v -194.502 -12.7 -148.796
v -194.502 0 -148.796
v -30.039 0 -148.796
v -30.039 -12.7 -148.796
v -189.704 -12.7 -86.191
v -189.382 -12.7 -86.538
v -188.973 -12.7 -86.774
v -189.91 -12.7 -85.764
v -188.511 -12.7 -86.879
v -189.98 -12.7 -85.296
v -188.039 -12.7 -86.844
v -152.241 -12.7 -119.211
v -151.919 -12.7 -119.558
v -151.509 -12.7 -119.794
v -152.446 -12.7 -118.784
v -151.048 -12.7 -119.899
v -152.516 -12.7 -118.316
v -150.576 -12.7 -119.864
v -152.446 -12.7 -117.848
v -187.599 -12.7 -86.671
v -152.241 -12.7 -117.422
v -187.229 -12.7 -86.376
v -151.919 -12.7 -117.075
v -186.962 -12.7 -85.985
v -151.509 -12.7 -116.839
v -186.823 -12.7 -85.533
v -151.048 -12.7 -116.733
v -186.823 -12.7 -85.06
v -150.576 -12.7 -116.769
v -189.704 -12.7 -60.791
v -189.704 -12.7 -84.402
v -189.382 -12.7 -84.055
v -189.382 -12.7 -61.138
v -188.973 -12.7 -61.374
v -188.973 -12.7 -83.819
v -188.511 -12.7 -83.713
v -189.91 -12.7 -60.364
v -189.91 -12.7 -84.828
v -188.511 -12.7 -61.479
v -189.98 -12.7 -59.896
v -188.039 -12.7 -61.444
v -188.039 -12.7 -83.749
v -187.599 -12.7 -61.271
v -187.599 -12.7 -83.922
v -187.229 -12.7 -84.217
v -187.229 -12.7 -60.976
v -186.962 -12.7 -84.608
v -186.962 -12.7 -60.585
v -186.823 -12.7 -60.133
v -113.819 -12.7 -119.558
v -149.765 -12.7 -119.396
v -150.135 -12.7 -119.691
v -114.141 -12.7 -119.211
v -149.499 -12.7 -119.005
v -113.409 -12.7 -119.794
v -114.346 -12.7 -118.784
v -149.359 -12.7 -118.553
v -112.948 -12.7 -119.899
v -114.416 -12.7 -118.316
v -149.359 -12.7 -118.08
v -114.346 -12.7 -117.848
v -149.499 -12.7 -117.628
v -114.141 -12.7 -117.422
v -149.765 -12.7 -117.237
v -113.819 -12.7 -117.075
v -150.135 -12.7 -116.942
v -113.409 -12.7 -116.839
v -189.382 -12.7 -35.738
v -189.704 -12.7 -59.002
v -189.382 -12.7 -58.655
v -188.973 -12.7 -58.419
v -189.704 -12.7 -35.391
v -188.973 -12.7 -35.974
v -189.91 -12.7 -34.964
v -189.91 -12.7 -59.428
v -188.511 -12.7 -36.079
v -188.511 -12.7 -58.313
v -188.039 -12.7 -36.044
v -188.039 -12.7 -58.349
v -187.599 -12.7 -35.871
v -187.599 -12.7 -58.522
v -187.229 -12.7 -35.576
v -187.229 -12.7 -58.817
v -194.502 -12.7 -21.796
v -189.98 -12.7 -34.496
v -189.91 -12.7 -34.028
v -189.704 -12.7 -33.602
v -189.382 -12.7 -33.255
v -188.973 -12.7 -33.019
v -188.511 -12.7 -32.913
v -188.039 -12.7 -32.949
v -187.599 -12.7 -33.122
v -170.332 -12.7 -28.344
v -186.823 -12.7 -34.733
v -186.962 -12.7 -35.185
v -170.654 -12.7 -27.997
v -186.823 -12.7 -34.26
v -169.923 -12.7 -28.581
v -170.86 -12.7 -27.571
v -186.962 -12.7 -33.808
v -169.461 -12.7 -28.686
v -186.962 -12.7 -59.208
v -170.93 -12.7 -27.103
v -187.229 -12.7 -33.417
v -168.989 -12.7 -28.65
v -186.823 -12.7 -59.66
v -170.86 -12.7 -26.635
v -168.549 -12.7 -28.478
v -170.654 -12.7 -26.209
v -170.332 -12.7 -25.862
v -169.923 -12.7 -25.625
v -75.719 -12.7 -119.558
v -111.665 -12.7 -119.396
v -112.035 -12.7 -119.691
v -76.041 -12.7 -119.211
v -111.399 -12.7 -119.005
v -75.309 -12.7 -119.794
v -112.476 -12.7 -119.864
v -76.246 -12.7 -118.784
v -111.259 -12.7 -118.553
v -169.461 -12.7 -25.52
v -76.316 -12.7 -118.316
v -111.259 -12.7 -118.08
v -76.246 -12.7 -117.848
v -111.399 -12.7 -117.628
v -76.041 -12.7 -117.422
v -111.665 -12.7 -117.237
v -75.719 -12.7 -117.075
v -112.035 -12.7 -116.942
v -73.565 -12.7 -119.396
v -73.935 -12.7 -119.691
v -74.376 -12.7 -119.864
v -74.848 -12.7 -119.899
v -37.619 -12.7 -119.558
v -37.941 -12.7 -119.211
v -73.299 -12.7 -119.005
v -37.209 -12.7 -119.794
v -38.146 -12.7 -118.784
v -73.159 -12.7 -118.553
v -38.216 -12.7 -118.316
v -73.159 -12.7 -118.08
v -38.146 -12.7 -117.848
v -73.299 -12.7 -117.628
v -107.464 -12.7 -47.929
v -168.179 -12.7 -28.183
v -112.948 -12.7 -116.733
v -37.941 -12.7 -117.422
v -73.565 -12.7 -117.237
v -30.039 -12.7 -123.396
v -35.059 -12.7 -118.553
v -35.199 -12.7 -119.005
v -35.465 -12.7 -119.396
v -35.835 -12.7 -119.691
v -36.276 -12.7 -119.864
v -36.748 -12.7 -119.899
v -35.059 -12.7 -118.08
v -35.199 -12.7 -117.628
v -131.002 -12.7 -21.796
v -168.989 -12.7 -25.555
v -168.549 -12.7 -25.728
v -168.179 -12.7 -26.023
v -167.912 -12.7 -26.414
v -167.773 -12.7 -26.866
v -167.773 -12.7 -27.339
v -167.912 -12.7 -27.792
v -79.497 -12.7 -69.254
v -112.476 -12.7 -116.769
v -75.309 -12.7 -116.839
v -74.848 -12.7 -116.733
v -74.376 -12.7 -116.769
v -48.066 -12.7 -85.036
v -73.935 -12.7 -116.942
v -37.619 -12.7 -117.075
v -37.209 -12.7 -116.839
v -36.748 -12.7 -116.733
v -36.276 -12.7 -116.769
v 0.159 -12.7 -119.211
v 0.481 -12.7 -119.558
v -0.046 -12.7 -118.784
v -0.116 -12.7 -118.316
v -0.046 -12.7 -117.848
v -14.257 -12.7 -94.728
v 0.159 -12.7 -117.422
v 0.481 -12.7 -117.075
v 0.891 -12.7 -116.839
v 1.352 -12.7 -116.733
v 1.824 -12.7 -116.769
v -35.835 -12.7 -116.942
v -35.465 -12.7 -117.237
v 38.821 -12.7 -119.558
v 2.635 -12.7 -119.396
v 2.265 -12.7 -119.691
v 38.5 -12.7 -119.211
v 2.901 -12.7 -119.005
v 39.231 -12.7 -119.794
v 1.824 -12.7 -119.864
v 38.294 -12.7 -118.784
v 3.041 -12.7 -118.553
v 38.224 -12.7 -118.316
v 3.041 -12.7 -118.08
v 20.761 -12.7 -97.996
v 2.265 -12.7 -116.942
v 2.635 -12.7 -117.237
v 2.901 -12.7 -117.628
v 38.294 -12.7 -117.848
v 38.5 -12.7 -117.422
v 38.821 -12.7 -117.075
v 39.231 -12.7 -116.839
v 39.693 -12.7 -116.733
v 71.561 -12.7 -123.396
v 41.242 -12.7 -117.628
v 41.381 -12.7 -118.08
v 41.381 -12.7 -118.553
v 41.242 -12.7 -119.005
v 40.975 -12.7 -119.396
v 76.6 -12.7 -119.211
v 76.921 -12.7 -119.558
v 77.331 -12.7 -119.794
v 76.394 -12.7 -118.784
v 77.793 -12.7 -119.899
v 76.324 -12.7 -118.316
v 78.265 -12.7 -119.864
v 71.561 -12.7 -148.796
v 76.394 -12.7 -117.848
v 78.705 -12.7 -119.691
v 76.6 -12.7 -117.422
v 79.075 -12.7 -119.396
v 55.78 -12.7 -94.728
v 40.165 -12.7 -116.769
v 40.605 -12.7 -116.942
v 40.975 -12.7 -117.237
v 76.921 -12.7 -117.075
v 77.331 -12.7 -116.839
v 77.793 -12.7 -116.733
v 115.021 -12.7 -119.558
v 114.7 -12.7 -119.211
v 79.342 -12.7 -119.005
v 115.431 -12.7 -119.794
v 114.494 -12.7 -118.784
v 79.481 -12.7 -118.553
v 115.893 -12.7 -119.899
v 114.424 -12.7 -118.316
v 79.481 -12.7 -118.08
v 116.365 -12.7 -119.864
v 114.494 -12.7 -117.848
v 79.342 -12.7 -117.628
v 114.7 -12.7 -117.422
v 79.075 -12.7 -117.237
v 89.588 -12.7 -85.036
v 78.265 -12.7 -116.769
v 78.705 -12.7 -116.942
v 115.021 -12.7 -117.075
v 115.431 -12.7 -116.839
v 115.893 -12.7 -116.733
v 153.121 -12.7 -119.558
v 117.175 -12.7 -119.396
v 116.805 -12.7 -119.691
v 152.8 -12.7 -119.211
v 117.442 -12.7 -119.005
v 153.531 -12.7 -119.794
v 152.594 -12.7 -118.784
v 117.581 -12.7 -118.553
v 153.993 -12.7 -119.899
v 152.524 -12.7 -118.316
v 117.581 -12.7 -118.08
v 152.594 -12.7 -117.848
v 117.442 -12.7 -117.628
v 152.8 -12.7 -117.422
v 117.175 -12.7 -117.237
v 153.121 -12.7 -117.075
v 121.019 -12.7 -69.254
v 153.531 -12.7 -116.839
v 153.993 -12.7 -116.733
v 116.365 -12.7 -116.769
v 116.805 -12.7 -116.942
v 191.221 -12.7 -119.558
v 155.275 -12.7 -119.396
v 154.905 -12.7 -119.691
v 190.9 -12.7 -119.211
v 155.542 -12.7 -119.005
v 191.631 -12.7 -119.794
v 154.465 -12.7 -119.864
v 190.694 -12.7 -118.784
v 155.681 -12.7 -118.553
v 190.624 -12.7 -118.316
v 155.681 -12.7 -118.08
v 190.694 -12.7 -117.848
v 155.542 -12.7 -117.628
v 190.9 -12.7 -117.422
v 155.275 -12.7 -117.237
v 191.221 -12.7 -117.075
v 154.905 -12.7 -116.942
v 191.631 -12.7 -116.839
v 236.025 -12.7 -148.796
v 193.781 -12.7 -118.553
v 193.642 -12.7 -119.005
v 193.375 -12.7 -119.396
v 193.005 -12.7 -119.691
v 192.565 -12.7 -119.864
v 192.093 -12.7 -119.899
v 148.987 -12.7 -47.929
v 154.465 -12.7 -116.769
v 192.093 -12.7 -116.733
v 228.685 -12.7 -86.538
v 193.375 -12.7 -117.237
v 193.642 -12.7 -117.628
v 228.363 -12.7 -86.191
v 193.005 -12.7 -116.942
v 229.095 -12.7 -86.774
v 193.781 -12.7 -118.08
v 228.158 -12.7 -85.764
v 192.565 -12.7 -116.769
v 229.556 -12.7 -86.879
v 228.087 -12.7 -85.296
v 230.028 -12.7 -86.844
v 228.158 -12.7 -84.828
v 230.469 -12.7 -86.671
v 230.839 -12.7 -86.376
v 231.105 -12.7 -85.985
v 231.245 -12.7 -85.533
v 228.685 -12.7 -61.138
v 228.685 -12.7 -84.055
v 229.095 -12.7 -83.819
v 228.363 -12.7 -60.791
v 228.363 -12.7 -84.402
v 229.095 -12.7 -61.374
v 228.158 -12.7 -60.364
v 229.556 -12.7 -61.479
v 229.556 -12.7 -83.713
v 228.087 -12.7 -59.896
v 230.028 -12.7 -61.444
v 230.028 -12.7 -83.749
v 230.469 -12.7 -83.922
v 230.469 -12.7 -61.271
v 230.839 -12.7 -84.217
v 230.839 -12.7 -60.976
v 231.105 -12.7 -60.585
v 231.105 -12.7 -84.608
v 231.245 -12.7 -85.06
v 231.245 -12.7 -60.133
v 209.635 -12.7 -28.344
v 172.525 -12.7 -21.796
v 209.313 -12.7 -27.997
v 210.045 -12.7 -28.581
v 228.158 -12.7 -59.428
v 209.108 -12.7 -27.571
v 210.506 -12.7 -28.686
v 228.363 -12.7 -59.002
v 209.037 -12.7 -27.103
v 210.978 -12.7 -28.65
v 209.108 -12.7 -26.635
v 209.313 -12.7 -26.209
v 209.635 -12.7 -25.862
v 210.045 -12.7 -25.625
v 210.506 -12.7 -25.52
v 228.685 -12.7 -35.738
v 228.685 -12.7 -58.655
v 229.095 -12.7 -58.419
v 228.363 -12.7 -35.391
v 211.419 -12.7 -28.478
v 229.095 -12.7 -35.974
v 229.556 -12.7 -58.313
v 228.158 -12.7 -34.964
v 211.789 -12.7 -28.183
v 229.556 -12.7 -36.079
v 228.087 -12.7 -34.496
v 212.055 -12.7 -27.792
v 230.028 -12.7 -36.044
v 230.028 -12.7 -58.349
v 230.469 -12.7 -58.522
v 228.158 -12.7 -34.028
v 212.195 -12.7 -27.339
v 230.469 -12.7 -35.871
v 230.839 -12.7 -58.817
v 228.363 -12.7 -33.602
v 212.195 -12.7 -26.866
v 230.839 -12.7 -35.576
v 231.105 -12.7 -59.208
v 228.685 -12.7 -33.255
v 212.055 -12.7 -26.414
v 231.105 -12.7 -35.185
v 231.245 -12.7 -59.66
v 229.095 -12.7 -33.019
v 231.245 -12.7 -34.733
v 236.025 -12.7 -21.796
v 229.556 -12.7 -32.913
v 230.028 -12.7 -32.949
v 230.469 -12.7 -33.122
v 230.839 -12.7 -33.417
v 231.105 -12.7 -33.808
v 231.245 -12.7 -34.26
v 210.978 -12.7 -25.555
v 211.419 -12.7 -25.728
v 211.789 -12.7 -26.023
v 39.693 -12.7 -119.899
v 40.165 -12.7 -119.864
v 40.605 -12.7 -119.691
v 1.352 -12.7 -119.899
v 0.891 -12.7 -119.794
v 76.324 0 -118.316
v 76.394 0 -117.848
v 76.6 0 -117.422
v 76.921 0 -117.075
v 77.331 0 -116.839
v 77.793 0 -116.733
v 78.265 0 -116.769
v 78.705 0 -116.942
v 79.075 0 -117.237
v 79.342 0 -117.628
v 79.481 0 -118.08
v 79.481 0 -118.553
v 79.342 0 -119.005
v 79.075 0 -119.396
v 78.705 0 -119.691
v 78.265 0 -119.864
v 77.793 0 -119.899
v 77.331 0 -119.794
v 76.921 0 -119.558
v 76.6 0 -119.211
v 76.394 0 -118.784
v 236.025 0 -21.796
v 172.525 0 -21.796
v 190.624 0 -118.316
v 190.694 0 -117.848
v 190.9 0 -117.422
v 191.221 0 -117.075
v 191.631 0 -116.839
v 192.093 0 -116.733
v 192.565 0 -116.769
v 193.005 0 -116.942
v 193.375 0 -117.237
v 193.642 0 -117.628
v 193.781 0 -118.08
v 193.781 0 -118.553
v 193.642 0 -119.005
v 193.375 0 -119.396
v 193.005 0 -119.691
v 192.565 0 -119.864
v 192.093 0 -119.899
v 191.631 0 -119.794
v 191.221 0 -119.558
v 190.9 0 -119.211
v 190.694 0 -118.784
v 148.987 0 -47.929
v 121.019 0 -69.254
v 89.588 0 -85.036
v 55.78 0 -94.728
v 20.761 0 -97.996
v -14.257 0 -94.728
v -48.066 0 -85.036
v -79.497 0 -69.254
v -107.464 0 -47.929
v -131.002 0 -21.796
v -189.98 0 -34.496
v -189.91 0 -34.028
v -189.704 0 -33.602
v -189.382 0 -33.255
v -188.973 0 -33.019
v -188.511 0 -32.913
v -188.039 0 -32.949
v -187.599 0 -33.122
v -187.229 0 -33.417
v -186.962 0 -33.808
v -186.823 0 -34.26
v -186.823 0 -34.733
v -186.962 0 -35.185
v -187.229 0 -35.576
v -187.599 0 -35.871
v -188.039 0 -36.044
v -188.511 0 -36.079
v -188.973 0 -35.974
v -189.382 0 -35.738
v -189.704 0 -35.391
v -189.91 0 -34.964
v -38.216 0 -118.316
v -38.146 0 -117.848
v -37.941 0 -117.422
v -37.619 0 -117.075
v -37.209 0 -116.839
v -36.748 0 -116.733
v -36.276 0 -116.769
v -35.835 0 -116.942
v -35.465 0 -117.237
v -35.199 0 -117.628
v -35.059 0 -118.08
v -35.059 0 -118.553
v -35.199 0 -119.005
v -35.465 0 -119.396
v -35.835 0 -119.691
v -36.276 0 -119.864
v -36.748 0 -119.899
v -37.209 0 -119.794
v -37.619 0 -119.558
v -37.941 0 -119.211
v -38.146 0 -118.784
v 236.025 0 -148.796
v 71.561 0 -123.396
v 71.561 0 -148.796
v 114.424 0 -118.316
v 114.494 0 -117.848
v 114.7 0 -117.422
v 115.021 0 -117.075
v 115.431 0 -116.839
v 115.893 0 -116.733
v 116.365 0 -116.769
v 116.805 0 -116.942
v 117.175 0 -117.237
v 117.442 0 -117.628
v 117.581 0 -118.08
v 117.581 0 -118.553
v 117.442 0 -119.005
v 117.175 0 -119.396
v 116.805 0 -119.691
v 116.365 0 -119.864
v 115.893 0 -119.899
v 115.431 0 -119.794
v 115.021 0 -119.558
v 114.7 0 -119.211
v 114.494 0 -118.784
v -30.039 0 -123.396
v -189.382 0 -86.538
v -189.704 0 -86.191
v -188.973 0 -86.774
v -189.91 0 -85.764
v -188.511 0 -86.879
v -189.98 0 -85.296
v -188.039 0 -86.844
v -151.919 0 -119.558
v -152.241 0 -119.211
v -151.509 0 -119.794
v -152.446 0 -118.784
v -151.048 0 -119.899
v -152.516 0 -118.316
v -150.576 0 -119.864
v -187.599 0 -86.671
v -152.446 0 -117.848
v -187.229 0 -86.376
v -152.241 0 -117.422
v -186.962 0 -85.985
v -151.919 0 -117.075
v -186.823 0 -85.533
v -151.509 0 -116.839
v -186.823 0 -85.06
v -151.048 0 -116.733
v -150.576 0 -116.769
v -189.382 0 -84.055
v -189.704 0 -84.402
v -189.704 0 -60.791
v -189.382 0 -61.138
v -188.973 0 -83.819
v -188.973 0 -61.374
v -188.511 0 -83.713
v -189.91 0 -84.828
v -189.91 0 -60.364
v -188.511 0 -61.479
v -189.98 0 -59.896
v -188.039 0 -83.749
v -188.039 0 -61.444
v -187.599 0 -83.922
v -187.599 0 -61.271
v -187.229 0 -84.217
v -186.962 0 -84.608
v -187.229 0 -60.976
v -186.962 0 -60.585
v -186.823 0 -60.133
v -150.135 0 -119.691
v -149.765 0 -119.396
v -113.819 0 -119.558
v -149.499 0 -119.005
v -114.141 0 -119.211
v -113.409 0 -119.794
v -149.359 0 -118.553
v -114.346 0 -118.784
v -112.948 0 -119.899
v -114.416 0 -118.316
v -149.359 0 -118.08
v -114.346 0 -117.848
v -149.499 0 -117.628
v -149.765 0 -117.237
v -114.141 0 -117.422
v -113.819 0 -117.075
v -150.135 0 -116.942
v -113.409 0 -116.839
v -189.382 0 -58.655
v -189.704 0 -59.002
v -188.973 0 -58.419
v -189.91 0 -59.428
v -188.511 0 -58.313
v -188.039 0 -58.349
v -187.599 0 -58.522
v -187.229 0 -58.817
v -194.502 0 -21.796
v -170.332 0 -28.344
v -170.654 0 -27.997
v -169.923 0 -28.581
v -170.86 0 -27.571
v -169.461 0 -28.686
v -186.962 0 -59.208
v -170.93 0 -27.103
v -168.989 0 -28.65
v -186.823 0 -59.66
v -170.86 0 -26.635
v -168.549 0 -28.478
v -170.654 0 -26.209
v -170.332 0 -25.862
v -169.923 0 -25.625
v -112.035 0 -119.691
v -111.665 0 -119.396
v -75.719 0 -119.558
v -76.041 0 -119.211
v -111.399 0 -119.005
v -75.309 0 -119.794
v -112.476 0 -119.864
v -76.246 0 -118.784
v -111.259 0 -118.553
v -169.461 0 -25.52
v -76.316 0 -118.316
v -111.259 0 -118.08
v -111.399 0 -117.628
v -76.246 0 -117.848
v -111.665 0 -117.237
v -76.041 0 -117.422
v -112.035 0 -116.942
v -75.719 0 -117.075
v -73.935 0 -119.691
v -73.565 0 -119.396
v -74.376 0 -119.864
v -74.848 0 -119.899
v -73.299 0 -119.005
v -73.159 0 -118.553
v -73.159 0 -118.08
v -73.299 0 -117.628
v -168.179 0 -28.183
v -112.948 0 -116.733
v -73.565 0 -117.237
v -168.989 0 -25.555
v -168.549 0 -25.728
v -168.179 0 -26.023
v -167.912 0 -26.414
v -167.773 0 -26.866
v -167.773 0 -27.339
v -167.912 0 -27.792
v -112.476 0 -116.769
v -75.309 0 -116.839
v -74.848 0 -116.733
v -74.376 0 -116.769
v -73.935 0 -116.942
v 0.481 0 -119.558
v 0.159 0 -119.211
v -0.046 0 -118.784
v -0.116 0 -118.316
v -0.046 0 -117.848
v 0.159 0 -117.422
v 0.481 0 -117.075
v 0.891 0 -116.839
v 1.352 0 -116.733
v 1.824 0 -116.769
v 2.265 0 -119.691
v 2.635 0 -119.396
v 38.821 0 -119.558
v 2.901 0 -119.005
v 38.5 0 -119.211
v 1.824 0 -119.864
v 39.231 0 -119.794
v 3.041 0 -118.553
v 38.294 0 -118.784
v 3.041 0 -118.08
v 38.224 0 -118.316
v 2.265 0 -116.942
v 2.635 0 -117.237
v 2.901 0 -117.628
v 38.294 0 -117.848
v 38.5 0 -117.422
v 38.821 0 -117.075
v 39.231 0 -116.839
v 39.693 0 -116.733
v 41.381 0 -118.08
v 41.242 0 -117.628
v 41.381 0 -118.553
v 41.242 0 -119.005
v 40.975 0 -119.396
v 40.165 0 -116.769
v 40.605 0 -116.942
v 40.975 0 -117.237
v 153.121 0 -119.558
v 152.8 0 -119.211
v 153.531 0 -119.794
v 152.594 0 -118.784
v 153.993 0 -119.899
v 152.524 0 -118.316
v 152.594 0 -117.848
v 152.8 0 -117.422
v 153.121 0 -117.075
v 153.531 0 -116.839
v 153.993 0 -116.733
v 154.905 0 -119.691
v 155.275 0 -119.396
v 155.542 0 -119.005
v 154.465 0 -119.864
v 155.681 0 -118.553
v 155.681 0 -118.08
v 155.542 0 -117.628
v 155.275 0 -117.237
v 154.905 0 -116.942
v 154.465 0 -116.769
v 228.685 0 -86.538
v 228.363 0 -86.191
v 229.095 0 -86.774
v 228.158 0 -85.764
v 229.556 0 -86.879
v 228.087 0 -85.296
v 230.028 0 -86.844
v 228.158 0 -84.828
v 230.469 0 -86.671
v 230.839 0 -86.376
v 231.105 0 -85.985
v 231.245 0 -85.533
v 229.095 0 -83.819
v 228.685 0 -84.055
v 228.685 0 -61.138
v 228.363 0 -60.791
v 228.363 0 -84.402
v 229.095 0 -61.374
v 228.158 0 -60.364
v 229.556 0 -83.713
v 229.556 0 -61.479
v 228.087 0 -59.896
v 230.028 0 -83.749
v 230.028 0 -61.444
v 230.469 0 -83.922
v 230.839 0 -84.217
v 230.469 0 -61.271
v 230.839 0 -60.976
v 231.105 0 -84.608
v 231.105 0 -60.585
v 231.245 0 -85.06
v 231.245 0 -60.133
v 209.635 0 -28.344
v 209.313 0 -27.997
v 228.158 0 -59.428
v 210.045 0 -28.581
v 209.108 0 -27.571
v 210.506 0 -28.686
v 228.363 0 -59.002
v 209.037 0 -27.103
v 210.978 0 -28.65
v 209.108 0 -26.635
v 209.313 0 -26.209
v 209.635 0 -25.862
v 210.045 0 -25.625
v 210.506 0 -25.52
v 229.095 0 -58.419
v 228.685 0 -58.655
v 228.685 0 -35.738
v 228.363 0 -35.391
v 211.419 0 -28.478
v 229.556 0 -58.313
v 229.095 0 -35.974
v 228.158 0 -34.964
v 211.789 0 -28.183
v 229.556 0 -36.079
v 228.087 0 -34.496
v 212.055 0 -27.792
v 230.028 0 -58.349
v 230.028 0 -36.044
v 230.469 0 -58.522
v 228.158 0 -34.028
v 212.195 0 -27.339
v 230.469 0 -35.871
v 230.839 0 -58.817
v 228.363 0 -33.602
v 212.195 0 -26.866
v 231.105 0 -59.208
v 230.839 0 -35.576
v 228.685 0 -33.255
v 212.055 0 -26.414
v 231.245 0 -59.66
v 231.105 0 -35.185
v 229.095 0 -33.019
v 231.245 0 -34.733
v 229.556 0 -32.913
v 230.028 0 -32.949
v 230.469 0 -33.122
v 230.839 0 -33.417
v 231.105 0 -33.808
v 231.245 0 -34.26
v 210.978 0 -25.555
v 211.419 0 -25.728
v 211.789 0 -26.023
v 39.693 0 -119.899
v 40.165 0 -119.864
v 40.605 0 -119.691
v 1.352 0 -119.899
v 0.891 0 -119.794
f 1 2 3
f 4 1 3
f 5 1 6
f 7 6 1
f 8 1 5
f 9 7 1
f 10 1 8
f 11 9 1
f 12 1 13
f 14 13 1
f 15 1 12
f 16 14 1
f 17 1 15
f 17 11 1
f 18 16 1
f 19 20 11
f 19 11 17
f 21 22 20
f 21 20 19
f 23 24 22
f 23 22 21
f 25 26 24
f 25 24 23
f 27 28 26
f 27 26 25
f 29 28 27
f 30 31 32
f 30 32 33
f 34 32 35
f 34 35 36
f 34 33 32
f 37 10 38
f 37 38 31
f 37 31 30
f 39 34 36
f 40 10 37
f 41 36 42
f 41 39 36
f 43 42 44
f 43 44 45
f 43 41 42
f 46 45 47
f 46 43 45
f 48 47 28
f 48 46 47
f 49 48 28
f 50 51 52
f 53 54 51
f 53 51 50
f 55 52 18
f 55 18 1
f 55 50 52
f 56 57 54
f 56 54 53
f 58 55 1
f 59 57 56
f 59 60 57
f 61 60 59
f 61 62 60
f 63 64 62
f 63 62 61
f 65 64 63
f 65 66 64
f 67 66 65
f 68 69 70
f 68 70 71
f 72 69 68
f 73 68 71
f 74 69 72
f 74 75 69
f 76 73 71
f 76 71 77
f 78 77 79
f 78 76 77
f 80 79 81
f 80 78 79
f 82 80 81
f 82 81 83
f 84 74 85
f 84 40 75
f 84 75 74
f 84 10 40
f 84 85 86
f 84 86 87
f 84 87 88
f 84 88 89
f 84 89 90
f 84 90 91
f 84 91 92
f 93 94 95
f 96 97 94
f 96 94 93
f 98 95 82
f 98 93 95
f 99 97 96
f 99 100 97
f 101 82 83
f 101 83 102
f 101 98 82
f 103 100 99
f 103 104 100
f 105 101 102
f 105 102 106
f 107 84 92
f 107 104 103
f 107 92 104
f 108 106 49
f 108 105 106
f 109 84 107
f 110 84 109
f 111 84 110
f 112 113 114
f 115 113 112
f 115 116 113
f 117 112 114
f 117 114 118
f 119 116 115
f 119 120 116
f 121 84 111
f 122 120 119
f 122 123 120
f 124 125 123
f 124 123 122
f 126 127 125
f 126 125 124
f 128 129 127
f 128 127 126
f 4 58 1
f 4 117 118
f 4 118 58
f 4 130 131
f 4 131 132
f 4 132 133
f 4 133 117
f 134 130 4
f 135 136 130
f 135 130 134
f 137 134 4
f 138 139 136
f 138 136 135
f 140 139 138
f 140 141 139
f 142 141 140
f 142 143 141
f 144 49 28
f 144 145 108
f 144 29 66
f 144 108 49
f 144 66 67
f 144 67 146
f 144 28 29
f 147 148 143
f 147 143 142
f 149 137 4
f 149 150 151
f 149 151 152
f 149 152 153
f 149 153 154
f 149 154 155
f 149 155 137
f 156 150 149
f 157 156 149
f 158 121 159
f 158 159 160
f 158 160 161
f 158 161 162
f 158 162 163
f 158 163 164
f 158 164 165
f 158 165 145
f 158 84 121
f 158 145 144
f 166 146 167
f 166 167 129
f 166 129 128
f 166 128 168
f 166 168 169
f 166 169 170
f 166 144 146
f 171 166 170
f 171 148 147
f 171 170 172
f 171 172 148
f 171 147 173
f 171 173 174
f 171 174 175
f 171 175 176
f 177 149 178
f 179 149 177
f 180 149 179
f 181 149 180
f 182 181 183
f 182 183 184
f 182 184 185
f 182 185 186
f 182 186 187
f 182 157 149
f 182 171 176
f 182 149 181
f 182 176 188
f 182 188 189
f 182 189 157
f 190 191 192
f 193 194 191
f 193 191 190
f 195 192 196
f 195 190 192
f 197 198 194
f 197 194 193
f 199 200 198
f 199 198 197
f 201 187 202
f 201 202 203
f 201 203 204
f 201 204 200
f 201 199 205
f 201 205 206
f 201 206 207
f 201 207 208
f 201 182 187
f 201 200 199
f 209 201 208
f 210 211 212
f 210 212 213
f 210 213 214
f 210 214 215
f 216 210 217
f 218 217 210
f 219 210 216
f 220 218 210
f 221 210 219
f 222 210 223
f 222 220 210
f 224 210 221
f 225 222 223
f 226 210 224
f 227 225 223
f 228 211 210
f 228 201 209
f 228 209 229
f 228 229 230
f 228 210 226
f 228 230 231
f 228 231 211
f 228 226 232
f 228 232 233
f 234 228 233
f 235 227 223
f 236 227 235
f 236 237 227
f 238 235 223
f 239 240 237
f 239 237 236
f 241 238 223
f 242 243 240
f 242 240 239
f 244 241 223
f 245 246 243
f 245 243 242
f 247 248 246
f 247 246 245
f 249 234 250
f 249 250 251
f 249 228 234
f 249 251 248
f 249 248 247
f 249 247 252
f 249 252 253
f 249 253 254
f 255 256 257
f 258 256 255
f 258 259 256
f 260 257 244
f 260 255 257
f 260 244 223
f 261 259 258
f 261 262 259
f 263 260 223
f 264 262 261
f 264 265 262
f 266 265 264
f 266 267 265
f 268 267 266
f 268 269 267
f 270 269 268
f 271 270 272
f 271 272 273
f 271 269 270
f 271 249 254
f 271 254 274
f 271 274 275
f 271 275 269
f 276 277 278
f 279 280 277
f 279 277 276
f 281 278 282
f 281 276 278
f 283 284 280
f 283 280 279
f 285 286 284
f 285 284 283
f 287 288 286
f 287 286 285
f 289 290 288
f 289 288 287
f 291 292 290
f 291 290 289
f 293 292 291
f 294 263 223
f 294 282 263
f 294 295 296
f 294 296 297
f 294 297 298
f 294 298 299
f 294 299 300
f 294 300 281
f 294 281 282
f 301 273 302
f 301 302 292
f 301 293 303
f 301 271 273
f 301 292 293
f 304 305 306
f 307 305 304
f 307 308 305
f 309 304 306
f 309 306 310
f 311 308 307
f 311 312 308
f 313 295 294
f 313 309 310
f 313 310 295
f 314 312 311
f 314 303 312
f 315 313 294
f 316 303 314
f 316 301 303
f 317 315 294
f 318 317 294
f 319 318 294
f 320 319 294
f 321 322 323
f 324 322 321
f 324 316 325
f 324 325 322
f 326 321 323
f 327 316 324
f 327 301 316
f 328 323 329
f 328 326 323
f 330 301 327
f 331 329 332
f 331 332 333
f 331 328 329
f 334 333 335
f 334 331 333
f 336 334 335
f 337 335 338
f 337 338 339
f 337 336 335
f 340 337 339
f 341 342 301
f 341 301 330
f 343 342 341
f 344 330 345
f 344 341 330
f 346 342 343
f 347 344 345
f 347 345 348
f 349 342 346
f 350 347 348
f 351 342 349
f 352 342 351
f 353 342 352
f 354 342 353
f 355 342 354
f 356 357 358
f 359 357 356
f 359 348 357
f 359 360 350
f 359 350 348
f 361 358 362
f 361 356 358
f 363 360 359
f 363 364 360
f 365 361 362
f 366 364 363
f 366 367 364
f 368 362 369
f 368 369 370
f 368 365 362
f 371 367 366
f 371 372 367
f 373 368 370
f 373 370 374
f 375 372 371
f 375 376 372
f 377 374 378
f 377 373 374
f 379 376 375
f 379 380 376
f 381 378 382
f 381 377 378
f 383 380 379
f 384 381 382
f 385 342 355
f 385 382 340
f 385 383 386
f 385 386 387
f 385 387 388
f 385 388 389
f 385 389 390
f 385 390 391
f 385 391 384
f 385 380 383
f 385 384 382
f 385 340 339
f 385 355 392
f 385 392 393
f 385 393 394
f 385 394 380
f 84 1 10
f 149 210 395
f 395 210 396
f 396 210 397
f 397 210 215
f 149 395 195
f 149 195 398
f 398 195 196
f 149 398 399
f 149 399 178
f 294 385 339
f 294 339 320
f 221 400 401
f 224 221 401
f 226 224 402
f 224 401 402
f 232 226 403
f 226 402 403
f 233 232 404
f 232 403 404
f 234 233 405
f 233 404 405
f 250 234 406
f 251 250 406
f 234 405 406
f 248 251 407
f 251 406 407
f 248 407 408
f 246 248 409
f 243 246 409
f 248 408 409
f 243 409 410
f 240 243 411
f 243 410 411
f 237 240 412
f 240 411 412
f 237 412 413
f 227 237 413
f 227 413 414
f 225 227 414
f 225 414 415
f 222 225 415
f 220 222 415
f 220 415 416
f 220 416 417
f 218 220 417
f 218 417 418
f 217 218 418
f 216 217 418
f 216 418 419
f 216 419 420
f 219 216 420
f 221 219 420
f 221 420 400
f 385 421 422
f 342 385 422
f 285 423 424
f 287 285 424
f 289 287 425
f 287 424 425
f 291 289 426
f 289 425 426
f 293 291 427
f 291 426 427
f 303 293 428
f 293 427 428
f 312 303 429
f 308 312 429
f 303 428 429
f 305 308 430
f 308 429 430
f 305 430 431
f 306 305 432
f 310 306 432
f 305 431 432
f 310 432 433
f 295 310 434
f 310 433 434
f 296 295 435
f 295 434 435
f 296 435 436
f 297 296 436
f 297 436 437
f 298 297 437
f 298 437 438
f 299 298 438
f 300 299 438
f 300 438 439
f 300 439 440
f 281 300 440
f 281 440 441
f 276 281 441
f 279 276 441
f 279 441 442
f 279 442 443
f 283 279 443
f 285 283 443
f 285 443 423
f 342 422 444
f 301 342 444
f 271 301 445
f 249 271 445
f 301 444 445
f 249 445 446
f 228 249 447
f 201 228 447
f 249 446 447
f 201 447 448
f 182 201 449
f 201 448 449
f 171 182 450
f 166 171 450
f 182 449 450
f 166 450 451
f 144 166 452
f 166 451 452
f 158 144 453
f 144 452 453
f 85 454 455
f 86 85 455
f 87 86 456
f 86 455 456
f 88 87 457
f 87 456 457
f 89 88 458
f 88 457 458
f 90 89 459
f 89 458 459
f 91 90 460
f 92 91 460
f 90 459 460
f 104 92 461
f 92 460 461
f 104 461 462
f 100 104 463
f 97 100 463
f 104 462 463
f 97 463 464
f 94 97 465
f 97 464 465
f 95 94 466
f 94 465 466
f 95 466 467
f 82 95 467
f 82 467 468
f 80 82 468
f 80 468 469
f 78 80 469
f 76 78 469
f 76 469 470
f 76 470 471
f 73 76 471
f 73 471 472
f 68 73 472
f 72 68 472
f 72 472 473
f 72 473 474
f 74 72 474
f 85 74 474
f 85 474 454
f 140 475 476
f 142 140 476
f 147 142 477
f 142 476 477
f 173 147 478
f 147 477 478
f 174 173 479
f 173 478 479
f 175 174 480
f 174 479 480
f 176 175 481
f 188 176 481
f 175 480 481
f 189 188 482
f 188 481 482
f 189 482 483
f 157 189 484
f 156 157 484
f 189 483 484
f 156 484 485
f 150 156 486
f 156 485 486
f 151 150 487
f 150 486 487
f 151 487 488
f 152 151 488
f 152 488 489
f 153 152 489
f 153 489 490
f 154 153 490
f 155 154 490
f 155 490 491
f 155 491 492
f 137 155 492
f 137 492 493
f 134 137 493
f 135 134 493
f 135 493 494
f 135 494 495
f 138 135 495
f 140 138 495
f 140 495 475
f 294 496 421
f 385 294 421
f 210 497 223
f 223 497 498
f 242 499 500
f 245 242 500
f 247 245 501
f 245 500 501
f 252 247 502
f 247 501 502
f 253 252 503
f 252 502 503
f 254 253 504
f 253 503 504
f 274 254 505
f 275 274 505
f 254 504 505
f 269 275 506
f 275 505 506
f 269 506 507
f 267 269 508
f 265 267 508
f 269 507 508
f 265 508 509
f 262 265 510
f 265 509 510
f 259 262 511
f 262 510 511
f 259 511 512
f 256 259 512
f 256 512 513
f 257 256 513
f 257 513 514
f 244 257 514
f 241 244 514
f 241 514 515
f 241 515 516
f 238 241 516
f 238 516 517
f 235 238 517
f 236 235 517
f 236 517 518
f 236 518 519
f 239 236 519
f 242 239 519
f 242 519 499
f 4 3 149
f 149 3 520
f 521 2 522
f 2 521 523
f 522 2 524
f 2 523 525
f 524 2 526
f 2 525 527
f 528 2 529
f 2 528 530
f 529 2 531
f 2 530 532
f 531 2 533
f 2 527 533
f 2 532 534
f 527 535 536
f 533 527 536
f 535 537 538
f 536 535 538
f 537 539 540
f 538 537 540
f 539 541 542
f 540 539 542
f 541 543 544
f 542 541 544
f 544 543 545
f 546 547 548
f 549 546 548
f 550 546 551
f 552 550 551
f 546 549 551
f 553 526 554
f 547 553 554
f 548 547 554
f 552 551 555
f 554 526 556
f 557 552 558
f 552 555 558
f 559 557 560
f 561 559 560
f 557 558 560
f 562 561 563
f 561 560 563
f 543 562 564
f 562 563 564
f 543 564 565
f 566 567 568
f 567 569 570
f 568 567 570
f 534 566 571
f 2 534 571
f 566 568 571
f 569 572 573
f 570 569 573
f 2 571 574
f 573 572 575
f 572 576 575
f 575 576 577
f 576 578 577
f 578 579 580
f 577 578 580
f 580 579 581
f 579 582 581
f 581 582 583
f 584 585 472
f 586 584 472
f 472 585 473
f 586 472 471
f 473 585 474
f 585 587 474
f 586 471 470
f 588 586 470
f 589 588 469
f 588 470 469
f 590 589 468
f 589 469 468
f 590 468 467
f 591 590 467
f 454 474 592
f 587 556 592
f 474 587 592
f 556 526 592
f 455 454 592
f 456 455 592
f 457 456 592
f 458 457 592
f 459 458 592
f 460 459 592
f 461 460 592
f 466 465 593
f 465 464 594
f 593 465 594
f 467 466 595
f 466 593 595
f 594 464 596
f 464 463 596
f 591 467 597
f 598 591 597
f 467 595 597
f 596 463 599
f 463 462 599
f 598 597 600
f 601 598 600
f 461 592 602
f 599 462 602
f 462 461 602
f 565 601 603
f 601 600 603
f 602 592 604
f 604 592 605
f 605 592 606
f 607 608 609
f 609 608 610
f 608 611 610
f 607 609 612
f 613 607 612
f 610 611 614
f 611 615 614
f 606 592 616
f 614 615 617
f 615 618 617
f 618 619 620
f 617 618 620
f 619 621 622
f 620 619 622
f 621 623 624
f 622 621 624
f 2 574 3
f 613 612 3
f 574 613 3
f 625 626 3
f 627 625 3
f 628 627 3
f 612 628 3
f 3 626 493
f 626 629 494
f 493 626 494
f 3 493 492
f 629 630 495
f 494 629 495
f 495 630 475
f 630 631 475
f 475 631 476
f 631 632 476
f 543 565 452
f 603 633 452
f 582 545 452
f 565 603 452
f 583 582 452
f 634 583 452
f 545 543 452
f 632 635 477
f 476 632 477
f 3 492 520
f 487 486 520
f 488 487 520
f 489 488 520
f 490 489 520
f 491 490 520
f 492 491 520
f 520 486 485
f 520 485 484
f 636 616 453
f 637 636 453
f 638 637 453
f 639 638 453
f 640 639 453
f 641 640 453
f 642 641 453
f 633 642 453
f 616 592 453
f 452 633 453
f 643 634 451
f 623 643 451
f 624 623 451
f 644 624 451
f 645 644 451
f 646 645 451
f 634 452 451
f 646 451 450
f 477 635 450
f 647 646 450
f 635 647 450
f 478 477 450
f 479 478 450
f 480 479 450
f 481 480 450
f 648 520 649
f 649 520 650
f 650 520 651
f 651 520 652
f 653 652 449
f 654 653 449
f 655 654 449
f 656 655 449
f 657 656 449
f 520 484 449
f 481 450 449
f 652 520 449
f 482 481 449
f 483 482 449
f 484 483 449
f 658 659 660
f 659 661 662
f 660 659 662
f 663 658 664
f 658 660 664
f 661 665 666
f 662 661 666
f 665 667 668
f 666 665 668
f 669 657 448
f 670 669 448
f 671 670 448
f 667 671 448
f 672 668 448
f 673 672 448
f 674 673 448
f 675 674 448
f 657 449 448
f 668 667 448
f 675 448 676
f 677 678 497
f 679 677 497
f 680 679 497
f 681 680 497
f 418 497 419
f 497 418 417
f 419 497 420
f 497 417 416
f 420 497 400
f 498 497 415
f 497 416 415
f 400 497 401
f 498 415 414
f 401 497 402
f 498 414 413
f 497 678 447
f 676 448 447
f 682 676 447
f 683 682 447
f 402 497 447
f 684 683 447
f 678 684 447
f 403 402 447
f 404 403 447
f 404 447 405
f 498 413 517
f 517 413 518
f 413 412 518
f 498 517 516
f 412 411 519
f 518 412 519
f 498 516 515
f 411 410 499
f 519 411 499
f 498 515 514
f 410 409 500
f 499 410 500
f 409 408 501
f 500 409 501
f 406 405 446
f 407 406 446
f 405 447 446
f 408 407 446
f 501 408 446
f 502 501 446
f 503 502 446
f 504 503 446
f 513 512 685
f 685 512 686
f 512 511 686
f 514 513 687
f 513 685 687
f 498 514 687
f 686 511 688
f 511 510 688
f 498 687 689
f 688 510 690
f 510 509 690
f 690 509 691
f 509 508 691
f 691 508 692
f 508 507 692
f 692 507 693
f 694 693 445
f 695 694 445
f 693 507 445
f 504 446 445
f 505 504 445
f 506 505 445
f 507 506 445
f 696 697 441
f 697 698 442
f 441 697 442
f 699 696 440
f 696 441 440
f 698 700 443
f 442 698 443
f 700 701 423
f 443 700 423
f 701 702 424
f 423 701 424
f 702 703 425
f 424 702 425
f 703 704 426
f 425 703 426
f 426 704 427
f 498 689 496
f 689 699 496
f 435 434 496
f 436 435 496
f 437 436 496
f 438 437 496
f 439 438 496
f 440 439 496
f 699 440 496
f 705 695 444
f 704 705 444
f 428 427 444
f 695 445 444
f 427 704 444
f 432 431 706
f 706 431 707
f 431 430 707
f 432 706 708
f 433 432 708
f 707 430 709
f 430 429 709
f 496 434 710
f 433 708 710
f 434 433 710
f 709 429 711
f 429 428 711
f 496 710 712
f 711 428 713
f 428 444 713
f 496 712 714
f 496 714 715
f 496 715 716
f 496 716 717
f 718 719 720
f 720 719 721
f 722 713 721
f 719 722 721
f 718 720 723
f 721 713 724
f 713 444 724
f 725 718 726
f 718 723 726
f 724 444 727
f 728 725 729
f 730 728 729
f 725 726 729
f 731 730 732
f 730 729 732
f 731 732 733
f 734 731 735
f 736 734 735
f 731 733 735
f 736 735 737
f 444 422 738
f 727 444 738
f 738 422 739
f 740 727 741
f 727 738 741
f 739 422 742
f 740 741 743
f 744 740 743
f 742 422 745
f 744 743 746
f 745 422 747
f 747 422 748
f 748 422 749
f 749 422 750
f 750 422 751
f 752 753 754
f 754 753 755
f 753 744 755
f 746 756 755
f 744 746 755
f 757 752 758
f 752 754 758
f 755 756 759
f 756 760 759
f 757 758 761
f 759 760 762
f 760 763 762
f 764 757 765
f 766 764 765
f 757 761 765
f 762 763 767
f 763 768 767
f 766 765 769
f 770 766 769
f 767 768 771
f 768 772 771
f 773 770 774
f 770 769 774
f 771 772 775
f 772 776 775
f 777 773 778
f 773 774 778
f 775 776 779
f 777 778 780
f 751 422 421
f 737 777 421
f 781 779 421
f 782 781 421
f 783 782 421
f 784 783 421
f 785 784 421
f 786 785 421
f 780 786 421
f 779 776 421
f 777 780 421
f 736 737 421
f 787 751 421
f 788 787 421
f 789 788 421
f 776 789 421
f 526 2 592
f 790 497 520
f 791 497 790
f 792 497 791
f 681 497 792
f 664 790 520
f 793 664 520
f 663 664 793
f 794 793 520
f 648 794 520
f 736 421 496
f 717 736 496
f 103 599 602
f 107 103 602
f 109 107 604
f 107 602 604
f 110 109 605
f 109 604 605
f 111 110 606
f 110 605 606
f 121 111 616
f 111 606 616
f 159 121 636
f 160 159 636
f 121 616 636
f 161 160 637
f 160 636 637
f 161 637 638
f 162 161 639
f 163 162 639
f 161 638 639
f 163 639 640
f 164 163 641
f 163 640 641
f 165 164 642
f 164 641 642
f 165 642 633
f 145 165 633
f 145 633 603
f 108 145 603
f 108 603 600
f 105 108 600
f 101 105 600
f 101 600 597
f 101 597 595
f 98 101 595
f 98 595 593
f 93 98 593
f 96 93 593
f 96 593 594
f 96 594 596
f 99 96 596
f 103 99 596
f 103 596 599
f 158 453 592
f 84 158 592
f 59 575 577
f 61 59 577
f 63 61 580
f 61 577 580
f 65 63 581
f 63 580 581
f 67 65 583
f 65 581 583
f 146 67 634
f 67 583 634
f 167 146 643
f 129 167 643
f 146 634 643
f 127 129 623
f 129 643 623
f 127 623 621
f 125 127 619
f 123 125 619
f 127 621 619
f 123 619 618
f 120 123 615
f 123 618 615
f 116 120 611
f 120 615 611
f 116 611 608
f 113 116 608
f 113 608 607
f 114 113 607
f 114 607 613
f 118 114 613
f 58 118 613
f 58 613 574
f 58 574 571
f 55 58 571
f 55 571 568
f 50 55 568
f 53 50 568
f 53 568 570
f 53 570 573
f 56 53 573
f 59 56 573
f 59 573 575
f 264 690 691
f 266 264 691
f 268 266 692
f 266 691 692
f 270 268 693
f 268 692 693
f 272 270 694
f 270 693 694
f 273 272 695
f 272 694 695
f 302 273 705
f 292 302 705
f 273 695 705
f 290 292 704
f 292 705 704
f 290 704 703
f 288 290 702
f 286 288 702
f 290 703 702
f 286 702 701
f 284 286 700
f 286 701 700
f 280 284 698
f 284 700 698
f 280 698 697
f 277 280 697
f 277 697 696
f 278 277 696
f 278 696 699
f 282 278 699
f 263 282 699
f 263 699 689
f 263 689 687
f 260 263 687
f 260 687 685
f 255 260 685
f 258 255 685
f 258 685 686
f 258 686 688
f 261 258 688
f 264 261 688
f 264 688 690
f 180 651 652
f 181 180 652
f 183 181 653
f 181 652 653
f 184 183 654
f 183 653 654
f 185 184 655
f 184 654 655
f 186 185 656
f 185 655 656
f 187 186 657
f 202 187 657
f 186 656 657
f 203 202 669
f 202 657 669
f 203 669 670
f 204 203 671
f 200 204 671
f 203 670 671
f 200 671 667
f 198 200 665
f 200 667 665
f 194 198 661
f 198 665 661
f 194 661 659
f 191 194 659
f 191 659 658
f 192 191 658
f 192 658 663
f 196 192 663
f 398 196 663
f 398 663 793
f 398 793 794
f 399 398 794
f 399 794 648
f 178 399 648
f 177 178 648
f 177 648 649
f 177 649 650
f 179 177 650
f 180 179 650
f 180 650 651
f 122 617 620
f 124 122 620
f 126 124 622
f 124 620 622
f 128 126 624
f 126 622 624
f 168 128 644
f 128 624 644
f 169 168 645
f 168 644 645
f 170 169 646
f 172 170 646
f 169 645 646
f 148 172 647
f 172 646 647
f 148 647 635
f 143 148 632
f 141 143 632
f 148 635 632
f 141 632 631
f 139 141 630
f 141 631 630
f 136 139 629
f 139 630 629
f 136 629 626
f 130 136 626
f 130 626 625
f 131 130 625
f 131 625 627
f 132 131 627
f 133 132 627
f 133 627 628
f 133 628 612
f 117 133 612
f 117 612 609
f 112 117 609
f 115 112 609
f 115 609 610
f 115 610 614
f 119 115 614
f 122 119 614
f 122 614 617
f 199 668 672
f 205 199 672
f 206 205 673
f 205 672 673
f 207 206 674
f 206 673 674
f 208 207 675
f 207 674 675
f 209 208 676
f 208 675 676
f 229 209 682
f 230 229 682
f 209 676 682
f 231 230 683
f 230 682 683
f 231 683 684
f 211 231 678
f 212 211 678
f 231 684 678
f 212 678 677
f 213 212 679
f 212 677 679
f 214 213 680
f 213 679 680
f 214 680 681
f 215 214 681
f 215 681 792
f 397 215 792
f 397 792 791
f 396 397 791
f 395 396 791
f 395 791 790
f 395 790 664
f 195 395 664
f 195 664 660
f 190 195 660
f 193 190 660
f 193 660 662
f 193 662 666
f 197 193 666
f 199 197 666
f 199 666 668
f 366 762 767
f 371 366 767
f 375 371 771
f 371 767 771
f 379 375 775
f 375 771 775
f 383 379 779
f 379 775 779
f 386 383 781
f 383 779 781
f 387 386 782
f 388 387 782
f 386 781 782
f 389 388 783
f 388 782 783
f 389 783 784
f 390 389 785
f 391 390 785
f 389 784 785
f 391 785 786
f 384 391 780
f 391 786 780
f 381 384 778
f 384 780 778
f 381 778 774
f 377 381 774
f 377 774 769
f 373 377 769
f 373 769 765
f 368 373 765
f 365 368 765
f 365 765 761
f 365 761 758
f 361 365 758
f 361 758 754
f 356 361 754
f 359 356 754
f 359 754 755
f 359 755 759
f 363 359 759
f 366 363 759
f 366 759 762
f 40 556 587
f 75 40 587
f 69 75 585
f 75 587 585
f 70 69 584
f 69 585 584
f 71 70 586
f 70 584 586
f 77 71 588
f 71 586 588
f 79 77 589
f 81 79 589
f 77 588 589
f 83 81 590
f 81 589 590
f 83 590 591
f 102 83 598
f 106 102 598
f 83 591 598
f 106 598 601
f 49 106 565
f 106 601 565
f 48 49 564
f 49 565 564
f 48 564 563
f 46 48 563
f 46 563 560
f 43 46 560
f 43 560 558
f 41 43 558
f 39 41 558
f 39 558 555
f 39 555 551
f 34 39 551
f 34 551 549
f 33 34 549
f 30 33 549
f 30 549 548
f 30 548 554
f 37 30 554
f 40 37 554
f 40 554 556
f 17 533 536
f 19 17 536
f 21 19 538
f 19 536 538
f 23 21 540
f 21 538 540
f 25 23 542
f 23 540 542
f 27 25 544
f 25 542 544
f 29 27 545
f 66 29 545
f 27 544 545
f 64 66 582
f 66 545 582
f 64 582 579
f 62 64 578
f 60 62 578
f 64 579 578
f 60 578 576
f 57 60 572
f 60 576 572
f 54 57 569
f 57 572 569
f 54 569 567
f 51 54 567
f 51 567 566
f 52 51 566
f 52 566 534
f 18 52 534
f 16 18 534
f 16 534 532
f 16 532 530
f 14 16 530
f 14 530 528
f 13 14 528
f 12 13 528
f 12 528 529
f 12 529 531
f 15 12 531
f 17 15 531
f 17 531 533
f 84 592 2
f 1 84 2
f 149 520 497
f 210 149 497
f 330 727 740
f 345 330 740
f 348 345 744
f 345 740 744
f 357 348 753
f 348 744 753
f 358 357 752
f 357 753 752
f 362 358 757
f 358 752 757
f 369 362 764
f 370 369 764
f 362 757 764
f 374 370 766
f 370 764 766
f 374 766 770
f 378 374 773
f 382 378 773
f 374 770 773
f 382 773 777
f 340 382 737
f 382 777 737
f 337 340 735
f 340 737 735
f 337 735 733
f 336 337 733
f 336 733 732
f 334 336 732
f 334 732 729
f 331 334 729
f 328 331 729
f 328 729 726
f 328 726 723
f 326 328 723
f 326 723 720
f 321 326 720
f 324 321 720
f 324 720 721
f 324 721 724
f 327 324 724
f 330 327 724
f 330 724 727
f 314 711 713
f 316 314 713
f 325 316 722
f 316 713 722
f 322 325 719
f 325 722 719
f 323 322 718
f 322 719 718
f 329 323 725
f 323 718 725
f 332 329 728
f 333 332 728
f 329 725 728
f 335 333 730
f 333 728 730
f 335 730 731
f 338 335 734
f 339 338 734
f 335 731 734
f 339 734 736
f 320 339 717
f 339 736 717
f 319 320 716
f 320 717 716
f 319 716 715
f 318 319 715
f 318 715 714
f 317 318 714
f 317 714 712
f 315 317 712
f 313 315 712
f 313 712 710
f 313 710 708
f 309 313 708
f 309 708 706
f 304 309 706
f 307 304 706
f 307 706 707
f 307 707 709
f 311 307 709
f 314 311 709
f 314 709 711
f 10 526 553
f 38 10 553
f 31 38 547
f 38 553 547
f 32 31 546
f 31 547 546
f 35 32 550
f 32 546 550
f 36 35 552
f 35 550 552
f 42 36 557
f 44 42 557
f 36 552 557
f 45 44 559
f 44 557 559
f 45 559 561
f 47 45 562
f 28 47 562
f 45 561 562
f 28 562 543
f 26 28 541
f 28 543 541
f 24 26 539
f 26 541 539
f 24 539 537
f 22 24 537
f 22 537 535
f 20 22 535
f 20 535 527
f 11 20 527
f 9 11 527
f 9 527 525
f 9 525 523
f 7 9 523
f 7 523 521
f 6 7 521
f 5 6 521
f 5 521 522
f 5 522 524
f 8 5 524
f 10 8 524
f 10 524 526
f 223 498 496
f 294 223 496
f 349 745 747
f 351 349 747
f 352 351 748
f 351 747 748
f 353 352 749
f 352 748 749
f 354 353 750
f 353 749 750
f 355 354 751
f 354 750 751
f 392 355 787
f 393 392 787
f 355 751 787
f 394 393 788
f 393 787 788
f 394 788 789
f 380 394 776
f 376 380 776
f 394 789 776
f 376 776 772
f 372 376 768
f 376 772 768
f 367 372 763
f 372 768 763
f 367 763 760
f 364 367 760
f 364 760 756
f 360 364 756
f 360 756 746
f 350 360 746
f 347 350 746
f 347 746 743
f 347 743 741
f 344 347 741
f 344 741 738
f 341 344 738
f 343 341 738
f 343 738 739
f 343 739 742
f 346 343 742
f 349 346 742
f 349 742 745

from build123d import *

# Parameters (mm, degrees)
F1_DEPTH = 12.7
F3_D     = 3.175


with BuildPart() as f1:
    # F0 (on Front) → F1 (new body)
    with BuildSketch(Plane.XZ):
        with BuildLine():
            Line((-131.002396, -21.796399), (-194.502396, -21.796399))
            Line((-194.502396, -21.796399), (-194.502396, -148.796399))
            Line((-194.502396, -148.796399), (-30.038724, -148.796399))
            Line((-30.038724, -148.796399), (-30.038724, -123.396399))
            Line((-30.038724, -123.396399), (71.561276, -123.396399))
            Line((71.561276, -123.396399), (71.561276, -148.796399))
            Line((71.561276, -148.796399), (236.024947, -148.796399))
            Line((236.024947, -148.796399), (236.024947, -21.796399))
            Line((236.024947, -21.796399), (172.524947, -21.796399))
            ThreePointArc((172.524947, -21.796399), (20.761276, -97.996399), (-131.002396, -21.796399))
        make_face()
    extrude(amount=F1_DEPTH)

    # F3 (through all)
    with Locations(Plane.XZ.offset(12.7)):
        with Locations((229.674947, -34.496399), (229.674947, -59.896399), (229.674947, -85.296399), (192.211276, -118.316399), (154.111276, -118.316399), (116.011276, -118.316399), (77.911276, -118.316399), (39.811276, -118.316399), (210.624947, -27.102793), (1.471006, -118.316399), (-36.628994, -118.316399), (-74.728994, -118.316399), (-112.828994, -118.316399), (-150.928994, -118.316399), (-188.392666, -85.296399), (-188.392666, -59.896399), (-188.392666, -34.496399), (-169.342666, -27.102793)):
            Hole(F3_D / 2)


solid = f1.part
